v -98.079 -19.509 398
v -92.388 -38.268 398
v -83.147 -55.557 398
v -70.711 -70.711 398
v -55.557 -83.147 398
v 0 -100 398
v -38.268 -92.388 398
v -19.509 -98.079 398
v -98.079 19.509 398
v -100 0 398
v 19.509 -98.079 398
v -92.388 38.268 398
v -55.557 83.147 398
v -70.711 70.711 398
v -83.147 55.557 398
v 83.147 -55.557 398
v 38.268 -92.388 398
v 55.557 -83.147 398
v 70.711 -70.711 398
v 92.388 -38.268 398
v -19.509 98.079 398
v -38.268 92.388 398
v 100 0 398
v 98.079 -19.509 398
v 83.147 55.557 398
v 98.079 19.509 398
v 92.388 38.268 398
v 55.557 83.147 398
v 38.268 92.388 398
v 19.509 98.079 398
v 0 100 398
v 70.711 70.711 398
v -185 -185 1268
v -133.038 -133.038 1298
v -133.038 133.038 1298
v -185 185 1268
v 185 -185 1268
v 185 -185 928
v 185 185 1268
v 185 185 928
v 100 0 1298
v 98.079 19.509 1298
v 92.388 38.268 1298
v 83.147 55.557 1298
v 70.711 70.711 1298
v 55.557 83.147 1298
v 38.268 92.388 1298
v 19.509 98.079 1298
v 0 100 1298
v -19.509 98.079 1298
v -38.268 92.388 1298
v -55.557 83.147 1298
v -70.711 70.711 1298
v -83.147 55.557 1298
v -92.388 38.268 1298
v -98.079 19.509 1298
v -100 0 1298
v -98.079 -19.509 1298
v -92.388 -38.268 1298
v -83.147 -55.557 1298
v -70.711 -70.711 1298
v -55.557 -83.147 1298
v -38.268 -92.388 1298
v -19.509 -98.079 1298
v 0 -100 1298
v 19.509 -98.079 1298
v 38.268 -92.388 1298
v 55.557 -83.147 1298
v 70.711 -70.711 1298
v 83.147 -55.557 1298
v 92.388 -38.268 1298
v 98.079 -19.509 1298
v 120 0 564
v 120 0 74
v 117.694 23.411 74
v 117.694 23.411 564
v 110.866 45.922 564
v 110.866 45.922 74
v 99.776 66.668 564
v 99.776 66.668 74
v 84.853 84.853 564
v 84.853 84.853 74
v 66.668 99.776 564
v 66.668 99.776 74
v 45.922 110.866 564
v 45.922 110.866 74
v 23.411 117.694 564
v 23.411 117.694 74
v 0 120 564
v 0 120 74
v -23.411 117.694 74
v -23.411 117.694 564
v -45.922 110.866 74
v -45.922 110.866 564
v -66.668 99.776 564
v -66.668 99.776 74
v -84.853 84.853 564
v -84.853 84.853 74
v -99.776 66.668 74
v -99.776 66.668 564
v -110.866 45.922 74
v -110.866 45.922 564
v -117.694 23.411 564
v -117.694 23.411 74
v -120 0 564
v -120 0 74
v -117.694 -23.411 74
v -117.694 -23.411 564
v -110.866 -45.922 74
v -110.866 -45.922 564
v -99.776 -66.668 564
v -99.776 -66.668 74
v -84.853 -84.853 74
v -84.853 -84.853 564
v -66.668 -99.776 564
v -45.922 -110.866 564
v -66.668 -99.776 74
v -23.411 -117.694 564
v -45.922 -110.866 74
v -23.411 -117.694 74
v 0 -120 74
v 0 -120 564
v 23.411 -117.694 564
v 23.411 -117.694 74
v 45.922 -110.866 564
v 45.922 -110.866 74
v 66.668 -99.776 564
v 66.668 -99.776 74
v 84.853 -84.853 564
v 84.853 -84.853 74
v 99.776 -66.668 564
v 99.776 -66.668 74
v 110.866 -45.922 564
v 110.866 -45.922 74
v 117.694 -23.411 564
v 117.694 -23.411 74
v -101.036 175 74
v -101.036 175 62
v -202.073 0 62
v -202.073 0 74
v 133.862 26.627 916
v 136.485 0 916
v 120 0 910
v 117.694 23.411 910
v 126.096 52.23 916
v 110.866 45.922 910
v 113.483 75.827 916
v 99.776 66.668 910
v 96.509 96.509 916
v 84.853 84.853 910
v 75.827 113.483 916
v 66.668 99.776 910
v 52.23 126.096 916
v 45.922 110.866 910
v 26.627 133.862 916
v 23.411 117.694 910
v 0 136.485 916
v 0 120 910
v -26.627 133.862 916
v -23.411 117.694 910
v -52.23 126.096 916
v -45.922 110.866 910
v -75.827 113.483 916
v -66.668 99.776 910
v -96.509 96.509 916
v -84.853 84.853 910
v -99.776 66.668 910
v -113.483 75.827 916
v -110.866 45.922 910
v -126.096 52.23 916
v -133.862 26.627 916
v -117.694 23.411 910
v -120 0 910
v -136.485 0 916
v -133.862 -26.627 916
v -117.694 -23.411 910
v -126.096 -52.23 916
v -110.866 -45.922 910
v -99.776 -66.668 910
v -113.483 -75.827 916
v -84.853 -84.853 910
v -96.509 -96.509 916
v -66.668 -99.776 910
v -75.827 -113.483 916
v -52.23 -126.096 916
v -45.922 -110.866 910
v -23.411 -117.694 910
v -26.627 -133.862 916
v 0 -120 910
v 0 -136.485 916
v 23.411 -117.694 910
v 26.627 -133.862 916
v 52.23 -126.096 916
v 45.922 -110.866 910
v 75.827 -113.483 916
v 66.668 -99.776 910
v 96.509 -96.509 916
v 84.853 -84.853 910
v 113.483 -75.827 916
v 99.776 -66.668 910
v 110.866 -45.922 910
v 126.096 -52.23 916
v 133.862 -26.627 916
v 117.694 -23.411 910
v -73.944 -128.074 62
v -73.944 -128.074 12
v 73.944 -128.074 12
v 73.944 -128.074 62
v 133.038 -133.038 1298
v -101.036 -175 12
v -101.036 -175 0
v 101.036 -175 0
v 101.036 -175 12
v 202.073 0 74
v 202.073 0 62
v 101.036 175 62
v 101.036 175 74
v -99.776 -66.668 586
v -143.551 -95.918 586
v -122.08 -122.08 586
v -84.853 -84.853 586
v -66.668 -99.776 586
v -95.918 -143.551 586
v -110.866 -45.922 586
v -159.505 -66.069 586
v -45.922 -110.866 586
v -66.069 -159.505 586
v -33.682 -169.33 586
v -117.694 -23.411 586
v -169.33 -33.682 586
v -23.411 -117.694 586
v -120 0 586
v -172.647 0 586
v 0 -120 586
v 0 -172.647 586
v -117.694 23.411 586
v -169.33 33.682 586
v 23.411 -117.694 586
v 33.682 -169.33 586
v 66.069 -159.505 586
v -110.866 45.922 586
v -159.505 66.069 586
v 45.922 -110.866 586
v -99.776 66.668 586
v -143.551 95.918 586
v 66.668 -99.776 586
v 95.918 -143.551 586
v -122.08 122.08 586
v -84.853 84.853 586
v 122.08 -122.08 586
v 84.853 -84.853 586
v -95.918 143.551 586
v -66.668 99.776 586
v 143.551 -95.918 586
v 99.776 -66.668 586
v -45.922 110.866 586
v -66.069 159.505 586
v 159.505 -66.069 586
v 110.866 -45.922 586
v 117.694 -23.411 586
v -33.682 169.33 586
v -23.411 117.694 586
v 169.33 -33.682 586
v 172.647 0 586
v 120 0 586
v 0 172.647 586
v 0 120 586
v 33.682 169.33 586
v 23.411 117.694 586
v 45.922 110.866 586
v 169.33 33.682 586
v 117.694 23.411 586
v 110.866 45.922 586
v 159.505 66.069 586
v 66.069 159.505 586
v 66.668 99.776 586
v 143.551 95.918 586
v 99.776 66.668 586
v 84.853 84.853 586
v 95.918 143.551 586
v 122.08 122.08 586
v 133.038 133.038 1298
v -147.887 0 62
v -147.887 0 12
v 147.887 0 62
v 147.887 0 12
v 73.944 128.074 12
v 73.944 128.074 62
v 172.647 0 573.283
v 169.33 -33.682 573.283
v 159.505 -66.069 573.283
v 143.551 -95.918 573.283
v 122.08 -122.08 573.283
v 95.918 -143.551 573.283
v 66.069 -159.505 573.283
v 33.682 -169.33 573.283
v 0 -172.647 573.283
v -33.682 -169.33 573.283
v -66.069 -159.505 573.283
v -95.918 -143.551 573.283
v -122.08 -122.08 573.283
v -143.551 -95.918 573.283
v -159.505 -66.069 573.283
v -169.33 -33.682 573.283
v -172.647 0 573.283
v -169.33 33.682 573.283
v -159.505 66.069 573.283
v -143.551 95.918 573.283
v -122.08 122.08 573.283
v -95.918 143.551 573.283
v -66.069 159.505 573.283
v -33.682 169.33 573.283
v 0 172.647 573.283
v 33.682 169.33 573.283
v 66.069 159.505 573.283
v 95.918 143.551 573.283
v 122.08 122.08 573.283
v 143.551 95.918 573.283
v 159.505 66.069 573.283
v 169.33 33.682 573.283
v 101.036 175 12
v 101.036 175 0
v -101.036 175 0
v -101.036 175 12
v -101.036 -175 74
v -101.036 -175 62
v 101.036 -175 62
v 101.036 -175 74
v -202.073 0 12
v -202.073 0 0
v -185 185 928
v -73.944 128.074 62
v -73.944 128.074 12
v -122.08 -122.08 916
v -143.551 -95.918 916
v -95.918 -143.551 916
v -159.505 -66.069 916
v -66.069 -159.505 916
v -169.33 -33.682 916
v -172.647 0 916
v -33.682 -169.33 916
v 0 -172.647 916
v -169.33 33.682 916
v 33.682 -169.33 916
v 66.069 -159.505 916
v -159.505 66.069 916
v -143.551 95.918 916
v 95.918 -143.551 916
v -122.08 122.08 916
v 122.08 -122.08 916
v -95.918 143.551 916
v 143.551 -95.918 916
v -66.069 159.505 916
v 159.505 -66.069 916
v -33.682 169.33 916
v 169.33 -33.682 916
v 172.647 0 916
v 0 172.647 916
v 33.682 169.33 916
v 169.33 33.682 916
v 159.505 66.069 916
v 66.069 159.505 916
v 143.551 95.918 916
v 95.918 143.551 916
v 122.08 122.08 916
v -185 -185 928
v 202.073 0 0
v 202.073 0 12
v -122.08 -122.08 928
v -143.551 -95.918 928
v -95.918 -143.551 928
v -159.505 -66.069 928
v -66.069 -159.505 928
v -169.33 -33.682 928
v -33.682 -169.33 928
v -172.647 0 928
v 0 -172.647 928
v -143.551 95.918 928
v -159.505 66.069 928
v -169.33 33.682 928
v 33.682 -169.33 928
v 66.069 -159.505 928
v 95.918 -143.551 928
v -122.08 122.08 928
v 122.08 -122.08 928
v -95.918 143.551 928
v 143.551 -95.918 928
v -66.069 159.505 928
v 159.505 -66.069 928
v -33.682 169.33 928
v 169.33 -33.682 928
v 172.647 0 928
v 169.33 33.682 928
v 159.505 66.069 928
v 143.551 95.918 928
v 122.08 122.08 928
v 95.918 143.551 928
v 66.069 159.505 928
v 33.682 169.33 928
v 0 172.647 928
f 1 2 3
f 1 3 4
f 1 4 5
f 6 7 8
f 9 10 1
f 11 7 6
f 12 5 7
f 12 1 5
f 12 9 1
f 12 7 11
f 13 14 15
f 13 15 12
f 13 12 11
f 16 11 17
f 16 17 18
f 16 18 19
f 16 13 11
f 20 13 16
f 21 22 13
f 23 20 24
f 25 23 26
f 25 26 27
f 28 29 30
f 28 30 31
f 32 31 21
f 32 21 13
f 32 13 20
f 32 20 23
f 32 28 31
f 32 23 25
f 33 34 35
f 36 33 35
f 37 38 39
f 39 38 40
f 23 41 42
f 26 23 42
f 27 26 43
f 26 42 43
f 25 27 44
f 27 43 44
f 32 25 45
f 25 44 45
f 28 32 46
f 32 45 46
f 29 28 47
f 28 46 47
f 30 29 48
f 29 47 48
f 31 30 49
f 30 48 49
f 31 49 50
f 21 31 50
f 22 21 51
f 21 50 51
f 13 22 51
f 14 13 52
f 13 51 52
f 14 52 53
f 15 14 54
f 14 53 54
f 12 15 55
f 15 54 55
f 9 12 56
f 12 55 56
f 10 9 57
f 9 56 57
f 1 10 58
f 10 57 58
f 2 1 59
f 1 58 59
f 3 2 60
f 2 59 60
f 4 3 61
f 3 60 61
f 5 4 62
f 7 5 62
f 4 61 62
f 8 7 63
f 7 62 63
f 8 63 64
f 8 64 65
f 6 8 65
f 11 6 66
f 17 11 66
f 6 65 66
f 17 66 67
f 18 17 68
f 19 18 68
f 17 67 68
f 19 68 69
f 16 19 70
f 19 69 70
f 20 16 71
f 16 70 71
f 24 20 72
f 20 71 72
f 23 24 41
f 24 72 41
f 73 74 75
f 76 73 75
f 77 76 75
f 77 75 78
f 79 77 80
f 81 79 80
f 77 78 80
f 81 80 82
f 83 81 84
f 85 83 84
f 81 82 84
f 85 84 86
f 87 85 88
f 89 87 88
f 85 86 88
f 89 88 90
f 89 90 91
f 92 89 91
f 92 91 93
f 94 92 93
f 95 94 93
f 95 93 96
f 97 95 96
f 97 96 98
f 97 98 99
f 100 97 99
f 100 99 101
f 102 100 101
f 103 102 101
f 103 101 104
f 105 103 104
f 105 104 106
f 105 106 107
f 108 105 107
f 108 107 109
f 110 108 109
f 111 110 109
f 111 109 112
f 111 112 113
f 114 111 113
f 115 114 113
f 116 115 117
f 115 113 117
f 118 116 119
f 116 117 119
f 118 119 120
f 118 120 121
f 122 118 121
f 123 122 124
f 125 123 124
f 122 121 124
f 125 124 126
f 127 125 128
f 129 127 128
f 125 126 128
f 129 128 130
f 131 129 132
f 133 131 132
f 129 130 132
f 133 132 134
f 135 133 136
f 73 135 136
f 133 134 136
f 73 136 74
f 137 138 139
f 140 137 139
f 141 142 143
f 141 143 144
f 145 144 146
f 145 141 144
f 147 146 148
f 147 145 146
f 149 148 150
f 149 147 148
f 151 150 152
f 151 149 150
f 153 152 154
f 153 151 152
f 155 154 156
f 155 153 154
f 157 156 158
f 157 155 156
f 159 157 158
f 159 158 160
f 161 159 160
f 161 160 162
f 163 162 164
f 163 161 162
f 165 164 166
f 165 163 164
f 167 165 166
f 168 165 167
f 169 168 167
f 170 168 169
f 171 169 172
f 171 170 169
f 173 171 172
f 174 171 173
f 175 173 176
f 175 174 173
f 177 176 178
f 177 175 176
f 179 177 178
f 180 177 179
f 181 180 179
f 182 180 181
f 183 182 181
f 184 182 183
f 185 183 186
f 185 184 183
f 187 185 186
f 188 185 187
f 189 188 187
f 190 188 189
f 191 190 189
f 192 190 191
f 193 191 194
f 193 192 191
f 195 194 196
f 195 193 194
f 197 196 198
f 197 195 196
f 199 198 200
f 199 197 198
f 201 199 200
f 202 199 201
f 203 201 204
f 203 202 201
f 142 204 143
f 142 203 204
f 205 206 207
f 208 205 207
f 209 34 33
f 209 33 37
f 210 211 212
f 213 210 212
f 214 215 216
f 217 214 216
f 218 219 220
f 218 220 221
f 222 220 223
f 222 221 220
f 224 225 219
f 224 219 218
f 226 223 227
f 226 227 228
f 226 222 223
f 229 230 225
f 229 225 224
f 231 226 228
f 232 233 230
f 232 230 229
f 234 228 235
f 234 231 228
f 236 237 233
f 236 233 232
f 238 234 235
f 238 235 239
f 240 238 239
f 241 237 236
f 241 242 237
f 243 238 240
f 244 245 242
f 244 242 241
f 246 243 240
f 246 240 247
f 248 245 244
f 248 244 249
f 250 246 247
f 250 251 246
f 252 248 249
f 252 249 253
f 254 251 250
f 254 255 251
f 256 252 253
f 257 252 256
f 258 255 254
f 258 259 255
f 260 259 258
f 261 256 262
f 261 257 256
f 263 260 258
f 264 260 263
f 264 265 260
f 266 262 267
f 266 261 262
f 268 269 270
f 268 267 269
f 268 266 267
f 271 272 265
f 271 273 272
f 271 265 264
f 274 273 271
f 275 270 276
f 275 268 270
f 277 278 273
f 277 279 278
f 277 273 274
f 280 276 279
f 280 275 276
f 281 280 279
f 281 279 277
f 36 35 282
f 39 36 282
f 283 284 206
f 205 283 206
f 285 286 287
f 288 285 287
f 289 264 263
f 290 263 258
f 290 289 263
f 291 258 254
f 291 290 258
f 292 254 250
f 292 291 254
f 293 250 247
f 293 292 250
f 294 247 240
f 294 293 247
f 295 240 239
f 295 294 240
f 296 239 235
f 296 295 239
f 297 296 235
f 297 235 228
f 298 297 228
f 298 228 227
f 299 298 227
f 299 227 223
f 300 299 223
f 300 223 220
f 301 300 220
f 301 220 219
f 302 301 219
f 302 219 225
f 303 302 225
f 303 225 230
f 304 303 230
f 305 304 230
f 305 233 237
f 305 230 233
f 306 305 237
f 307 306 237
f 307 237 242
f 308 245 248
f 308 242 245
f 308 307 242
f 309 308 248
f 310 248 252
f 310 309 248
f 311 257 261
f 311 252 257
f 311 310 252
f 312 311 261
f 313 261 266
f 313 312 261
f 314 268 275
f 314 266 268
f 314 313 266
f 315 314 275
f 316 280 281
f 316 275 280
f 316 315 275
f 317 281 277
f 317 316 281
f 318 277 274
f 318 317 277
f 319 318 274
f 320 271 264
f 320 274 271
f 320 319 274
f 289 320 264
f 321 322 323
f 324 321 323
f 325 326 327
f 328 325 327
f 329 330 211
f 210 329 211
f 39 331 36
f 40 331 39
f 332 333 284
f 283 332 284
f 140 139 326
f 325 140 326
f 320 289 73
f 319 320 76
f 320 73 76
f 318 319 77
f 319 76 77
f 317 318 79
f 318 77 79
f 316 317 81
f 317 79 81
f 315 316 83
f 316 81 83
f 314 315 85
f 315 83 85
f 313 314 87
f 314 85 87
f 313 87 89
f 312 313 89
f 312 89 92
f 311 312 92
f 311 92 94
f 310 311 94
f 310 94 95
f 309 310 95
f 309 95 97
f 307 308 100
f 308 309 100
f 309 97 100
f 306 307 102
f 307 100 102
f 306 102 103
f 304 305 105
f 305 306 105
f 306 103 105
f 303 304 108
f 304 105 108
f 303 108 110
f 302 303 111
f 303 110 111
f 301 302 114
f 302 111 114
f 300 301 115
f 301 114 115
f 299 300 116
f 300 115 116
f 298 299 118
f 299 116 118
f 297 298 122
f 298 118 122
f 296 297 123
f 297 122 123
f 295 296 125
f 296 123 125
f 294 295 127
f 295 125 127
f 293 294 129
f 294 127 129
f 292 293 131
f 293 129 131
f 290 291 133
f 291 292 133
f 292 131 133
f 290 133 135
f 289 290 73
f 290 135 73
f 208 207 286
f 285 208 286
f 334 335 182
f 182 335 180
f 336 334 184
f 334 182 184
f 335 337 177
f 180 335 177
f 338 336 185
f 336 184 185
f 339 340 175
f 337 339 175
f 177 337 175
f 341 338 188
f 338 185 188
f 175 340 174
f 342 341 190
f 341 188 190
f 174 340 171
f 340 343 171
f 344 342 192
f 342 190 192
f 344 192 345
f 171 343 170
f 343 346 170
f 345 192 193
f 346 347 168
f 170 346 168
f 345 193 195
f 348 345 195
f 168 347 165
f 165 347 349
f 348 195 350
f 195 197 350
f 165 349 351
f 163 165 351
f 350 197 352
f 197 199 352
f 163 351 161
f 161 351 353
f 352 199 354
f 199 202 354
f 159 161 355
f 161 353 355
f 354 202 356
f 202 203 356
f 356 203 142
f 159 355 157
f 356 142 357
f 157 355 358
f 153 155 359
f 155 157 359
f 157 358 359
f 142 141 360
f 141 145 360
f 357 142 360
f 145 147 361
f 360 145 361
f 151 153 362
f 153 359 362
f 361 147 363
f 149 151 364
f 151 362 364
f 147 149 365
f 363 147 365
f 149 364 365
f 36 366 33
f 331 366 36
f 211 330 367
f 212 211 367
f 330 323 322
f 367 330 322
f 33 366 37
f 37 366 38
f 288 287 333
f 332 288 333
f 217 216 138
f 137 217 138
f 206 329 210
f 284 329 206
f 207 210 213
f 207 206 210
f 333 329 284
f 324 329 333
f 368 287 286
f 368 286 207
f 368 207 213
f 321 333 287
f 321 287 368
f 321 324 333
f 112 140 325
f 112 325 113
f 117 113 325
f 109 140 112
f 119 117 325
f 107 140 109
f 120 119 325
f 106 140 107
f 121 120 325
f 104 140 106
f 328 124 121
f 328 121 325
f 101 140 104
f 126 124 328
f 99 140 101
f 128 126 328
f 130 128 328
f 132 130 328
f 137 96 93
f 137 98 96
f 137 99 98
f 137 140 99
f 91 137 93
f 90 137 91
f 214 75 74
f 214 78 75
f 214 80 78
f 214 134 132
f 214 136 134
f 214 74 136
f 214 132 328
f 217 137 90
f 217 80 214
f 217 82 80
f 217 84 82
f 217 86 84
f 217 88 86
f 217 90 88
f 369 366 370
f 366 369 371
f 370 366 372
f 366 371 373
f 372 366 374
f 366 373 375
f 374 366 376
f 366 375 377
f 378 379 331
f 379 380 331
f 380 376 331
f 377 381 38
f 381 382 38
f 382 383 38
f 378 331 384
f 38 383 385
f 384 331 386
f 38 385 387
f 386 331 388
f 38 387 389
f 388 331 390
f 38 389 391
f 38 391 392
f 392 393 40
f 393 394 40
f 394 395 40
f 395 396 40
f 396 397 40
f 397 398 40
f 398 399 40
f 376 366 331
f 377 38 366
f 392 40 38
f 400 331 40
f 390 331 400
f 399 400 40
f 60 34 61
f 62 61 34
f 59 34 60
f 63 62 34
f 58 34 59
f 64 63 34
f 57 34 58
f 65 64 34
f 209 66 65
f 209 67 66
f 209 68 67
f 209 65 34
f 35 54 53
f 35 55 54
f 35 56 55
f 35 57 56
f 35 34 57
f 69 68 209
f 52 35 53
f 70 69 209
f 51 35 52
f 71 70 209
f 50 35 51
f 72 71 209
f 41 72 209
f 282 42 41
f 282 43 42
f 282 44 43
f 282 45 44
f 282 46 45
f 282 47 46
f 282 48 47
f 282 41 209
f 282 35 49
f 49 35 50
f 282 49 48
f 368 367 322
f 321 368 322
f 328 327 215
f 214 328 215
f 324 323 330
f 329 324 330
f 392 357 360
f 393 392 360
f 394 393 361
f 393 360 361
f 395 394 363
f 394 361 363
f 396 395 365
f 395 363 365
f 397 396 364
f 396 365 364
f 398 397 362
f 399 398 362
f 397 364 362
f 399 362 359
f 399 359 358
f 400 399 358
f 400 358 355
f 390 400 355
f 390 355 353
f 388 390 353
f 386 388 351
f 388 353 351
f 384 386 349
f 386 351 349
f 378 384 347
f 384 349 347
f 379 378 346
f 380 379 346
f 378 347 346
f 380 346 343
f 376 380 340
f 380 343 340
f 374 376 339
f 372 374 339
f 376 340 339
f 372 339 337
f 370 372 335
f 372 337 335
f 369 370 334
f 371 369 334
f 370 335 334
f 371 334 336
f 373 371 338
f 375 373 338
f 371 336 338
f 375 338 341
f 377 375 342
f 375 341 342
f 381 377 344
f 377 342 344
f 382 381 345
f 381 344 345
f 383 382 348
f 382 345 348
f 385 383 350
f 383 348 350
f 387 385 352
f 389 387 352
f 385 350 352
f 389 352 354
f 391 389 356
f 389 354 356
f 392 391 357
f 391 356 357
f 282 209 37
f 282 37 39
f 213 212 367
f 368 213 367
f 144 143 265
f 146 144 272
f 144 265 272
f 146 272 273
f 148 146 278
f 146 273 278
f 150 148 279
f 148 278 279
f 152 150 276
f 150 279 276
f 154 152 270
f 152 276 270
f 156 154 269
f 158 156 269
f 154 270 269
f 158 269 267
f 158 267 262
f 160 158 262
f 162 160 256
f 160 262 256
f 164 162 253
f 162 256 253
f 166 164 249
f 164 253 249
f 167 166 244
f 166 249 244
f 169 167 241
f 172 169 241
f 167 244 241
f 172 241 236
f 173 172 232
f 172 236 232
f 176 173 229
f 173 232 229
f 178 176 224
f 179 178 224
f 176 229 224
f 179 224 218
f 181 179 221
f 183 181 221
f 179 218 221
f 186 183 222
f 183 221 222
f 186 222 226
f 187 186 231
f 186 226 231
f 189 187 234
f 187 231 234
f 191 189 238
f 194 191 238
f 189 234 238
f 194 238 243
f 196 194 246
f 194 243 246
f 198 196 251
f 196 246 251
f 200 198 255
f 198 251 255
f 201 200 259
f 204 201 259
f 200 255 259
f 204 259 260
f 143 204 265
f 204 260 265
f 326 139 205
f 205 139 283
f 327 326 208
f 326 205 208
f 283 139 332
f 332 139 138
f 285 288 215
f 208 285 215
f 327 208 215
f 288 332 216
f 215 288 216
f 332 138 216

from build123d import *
from OCP.BRepFilletAPI import BRepFilletAPI_MakeChamfer

# Parameters (mm, degrees)
BOSS_EXTRUDE1_DEPTH = 12
BOSS_EXTRUDE2_DEPTH = 50
BOSS_EXTRUDE3_DEPTH = 12
SKETCH4_R           = 120
BOSS_EXTRUDE4_DEPTH = 500
SKETCH5_R           = 172.646944325
BOSS_EXTRUDE5_DEPTH = 12
CHAMFER1_SIZE       = 56.712818196
CHAMFER1_SIZE_2     = 10
SKETCH6_R           = 120
BOSS_EXTRUDE6_DEPTH = 330
SKETCH8_R           = 172.646944325
BOSS_EXTRUDE7_DEPTH = 12
CHAMFER2_SIZE       = 6
CHAMFER2_SIZE2      = 16.484864517
SKETCH9_W           = 370
SKETCH9_H           = 370
BOSS_EXTRUDE8_DEPTH = 370
SKETCH10_R          = 100
CUT_EXTRUDE1_DEPTH  = 900
CHAMFER3_SIZE       = 30
CHAMFER3_SIZE2      = 51.961524227


with BuildPart() as part:
    # Sketch1 → Boss-Extrude1 (new body)
    with BuildSketch(Plane.XY):
        Polygon((202.072594216, 0), (101.036297108, 175), (-101.036297108, 175), (-202.072594216, 0), (-101.036297108, -175), (101.036297108, -175), align=None)
    extrude(amount=BOSS_EXTRUDE1_DEPTH)

    # Sketch2 → Boss-Extrude2 (add)
    with BuildSketch(Plane.XY.offset(12)):
        Polygon((147.887498821, 0), (73.943749411, 128.074330881), (-73.943749411, 128.074330881), (-147.887498821, 0), (-73.943749411, -128.074330881), (73.943749411, -128.074330881), align=None)
    extrude(amount=BOSS_EXTRUDE2_DEPTH)

    # Sketch3 → Boss-Extrude3 (add)
    with BuildSketch(Plane.XY.offset(62)):
        Polygon((202.072594216, 0), (101.036297108, 175), (-101.036297108, 175), (-202.072594216, 0), (-101.036297108, -175), (101.036297108, -175), align=None)
    extrude(amount=BOSS_EXTRUDE3_DEPTH)

    # Sketch4 → Boss-Extrude4 (add)
    with BuildSketch(Plane.XY.offset(74)):
        Circle(SKETCH4_R)
    extrude(amount=BOSS_EXTRUDE4_DEPTH)

    # Sketch5 → Boss-Extrude5 (add)
    with BuildSketch(Plane.XY.offset(574)):
        Circle(SKETCH5_R)
    extrude(amount=BOSS_EXTRUDE5_DEPTH)

    # Chamfer1
    # the kernel refuses this chamfer: 56.712818196, 10 mm, written as the material it adds along each edge
    with BuildSketch(Plane(origin=(0, 0, 574), x_dir=(1, 0, 0), z_dir=(0, -1, 0))) as chamfer1_piece_1_section:
        Polygon((120 + CHAMFER1_SIZE, 0), (120, -CHAMFER1_SIZE_2), (120, 0), align=None)
    chamfer1_piece_1 = revolve(axis=Axis((0, 0, 574), (0, 0, 1)), mode=Mode.PRIVATE)
    chamfer1_piece_1 = chamfer1_piece_1 & Plane(origin=(0, 0, 569.114385433), x_dir=(1, 0, 0), z_dir=(0, 0, -1)) * Cylinder(172.646944325, 707, mode=Mode.PRIVATE)
    add(chamfer1_piece_1)

    # Sketch6 → Boss-Extrude6 (add)
    with BuildSketch(Plane.XY.offset(586)):
        Circle(SKETCH6_R)
    extrude(amount=BOSS_EXTRUDE6_DEPTH)

    # Sketch8 → Boss-Extrude7 (add)
    with BuildSketch(Plane.XY.offset(916)):
        Circle(SKETCH8_R)
    extrude(amount=BOSS_EXTRUDE7_DEPTH)

    # Chamfer2
    chamfer2_edges = [part.edges().sort_by_distance(p)[0] for p in [
        (-120, 0, 916),
    ]]
    chamfer2_side = [part.faces().sort_by_distance(p)[0] for p in [
        (-120, 0, 751),
    ]]
    chamfer(chamfer2_edges, length=CHAMFER2_SIZE, length2=CHAMFER2_SIZE2, reference=chamfer2_side[0])

    # Sketch9 → Boss-Extrude8 (add)
    with BuildSketch(Plane.XY.offset(928)):
        Rectangle(SKETCH9_W, SKETCH9_H)
    extrude(amount=BOSS_EXTRUDE8_DEPTH)

    # Sketch10 → Cut-Extrude1 (cut)
    with BuildSketch(Plane.XY.offset(1298)):
        Circle(SKETCH10_R)
    extrude(amount=-CUT_EXTRUDE1_DEPTH, mode=Mode.SUBTRACT)

    # Chamfer3: one chamfer whose edges measure the first distance from different faces: ONE call of the kernel's chamfer builder (chamfer() names one face for all edges)
    chamfer3_edges_1 = [part.edges().sort_by_distance(p)[0] for p in [
        (185, 0, 1298),
    ]]
    chamfer3_side_1 = [part.faces().sort_by_distance(p)[0] for p in [
        (185, 0, 1113),
    ]]
    chamfer3_edges_2 = [part.edges().sort_by_distance(p)[0] for p in [
        (0, 185, 1298),
    ]]
    chamfer3_side_2 = [part.faces().sort_by_distance(p)[0] for p in [
        (0, 185, 1113),
    ]]
    chamfer3_edges_3 = [part.edges().sort_by_distance(p)[0] for p in [
        (-185, 0, 1298),
    ]]
    chamfer3_side_3 = [part.faces().sort_by_distance(p)[0] for p in [
        (-185, 0, 1113),
    ]]
    chamfer3_edges_4 = [part.edges().sort_by_distance(p)[0] for p in [
        (0, -185, 1298),
    ]]
    chamfer3_side_4 = [part.faces().sort_by_distance(p)[0] for p in [
        (0, -185, 1113),
    ]]
    chamfer3 = BRepFilletAPI_MakeChamfer(part.part.solid().wrapped)
    for e in chamfer3_edges_1:
        chamfer3.Add(CHAMFER3_SIZE, CHAMFER3_SIZE2, e.wrapped, chamfer3_side_1[0].wrapped)  # the first distance lies on this face
    for e in chamfer3_edges_2:
        chamfer3.Add(CHAMFER3_SIZE, CHAMFER3_SIZE2, e.wrapped, chamfer3_side_2[0].wrapped)  # the first distance lies on this face
    for e in chamfer3_edges_3:
        chamfer3.Add(CHAMFER3_SIZE, CHAMFER3_SIZE2, e.wrapped, chamfer3_side_3[0].wrapped)  # the first distance lies on this face
    for e in chamfer3_edges_4:
        chamfer3.Add(CHAMFER3_SIZE, CHAMFER3_SIZE2, e.wrapped, chamfer3_side_4[0].wrapped)  # the first distance lies on this face
    add(Compound.cast(chamfer3.Shape()), mode=Mode.REPLACE)


solid = part.part
